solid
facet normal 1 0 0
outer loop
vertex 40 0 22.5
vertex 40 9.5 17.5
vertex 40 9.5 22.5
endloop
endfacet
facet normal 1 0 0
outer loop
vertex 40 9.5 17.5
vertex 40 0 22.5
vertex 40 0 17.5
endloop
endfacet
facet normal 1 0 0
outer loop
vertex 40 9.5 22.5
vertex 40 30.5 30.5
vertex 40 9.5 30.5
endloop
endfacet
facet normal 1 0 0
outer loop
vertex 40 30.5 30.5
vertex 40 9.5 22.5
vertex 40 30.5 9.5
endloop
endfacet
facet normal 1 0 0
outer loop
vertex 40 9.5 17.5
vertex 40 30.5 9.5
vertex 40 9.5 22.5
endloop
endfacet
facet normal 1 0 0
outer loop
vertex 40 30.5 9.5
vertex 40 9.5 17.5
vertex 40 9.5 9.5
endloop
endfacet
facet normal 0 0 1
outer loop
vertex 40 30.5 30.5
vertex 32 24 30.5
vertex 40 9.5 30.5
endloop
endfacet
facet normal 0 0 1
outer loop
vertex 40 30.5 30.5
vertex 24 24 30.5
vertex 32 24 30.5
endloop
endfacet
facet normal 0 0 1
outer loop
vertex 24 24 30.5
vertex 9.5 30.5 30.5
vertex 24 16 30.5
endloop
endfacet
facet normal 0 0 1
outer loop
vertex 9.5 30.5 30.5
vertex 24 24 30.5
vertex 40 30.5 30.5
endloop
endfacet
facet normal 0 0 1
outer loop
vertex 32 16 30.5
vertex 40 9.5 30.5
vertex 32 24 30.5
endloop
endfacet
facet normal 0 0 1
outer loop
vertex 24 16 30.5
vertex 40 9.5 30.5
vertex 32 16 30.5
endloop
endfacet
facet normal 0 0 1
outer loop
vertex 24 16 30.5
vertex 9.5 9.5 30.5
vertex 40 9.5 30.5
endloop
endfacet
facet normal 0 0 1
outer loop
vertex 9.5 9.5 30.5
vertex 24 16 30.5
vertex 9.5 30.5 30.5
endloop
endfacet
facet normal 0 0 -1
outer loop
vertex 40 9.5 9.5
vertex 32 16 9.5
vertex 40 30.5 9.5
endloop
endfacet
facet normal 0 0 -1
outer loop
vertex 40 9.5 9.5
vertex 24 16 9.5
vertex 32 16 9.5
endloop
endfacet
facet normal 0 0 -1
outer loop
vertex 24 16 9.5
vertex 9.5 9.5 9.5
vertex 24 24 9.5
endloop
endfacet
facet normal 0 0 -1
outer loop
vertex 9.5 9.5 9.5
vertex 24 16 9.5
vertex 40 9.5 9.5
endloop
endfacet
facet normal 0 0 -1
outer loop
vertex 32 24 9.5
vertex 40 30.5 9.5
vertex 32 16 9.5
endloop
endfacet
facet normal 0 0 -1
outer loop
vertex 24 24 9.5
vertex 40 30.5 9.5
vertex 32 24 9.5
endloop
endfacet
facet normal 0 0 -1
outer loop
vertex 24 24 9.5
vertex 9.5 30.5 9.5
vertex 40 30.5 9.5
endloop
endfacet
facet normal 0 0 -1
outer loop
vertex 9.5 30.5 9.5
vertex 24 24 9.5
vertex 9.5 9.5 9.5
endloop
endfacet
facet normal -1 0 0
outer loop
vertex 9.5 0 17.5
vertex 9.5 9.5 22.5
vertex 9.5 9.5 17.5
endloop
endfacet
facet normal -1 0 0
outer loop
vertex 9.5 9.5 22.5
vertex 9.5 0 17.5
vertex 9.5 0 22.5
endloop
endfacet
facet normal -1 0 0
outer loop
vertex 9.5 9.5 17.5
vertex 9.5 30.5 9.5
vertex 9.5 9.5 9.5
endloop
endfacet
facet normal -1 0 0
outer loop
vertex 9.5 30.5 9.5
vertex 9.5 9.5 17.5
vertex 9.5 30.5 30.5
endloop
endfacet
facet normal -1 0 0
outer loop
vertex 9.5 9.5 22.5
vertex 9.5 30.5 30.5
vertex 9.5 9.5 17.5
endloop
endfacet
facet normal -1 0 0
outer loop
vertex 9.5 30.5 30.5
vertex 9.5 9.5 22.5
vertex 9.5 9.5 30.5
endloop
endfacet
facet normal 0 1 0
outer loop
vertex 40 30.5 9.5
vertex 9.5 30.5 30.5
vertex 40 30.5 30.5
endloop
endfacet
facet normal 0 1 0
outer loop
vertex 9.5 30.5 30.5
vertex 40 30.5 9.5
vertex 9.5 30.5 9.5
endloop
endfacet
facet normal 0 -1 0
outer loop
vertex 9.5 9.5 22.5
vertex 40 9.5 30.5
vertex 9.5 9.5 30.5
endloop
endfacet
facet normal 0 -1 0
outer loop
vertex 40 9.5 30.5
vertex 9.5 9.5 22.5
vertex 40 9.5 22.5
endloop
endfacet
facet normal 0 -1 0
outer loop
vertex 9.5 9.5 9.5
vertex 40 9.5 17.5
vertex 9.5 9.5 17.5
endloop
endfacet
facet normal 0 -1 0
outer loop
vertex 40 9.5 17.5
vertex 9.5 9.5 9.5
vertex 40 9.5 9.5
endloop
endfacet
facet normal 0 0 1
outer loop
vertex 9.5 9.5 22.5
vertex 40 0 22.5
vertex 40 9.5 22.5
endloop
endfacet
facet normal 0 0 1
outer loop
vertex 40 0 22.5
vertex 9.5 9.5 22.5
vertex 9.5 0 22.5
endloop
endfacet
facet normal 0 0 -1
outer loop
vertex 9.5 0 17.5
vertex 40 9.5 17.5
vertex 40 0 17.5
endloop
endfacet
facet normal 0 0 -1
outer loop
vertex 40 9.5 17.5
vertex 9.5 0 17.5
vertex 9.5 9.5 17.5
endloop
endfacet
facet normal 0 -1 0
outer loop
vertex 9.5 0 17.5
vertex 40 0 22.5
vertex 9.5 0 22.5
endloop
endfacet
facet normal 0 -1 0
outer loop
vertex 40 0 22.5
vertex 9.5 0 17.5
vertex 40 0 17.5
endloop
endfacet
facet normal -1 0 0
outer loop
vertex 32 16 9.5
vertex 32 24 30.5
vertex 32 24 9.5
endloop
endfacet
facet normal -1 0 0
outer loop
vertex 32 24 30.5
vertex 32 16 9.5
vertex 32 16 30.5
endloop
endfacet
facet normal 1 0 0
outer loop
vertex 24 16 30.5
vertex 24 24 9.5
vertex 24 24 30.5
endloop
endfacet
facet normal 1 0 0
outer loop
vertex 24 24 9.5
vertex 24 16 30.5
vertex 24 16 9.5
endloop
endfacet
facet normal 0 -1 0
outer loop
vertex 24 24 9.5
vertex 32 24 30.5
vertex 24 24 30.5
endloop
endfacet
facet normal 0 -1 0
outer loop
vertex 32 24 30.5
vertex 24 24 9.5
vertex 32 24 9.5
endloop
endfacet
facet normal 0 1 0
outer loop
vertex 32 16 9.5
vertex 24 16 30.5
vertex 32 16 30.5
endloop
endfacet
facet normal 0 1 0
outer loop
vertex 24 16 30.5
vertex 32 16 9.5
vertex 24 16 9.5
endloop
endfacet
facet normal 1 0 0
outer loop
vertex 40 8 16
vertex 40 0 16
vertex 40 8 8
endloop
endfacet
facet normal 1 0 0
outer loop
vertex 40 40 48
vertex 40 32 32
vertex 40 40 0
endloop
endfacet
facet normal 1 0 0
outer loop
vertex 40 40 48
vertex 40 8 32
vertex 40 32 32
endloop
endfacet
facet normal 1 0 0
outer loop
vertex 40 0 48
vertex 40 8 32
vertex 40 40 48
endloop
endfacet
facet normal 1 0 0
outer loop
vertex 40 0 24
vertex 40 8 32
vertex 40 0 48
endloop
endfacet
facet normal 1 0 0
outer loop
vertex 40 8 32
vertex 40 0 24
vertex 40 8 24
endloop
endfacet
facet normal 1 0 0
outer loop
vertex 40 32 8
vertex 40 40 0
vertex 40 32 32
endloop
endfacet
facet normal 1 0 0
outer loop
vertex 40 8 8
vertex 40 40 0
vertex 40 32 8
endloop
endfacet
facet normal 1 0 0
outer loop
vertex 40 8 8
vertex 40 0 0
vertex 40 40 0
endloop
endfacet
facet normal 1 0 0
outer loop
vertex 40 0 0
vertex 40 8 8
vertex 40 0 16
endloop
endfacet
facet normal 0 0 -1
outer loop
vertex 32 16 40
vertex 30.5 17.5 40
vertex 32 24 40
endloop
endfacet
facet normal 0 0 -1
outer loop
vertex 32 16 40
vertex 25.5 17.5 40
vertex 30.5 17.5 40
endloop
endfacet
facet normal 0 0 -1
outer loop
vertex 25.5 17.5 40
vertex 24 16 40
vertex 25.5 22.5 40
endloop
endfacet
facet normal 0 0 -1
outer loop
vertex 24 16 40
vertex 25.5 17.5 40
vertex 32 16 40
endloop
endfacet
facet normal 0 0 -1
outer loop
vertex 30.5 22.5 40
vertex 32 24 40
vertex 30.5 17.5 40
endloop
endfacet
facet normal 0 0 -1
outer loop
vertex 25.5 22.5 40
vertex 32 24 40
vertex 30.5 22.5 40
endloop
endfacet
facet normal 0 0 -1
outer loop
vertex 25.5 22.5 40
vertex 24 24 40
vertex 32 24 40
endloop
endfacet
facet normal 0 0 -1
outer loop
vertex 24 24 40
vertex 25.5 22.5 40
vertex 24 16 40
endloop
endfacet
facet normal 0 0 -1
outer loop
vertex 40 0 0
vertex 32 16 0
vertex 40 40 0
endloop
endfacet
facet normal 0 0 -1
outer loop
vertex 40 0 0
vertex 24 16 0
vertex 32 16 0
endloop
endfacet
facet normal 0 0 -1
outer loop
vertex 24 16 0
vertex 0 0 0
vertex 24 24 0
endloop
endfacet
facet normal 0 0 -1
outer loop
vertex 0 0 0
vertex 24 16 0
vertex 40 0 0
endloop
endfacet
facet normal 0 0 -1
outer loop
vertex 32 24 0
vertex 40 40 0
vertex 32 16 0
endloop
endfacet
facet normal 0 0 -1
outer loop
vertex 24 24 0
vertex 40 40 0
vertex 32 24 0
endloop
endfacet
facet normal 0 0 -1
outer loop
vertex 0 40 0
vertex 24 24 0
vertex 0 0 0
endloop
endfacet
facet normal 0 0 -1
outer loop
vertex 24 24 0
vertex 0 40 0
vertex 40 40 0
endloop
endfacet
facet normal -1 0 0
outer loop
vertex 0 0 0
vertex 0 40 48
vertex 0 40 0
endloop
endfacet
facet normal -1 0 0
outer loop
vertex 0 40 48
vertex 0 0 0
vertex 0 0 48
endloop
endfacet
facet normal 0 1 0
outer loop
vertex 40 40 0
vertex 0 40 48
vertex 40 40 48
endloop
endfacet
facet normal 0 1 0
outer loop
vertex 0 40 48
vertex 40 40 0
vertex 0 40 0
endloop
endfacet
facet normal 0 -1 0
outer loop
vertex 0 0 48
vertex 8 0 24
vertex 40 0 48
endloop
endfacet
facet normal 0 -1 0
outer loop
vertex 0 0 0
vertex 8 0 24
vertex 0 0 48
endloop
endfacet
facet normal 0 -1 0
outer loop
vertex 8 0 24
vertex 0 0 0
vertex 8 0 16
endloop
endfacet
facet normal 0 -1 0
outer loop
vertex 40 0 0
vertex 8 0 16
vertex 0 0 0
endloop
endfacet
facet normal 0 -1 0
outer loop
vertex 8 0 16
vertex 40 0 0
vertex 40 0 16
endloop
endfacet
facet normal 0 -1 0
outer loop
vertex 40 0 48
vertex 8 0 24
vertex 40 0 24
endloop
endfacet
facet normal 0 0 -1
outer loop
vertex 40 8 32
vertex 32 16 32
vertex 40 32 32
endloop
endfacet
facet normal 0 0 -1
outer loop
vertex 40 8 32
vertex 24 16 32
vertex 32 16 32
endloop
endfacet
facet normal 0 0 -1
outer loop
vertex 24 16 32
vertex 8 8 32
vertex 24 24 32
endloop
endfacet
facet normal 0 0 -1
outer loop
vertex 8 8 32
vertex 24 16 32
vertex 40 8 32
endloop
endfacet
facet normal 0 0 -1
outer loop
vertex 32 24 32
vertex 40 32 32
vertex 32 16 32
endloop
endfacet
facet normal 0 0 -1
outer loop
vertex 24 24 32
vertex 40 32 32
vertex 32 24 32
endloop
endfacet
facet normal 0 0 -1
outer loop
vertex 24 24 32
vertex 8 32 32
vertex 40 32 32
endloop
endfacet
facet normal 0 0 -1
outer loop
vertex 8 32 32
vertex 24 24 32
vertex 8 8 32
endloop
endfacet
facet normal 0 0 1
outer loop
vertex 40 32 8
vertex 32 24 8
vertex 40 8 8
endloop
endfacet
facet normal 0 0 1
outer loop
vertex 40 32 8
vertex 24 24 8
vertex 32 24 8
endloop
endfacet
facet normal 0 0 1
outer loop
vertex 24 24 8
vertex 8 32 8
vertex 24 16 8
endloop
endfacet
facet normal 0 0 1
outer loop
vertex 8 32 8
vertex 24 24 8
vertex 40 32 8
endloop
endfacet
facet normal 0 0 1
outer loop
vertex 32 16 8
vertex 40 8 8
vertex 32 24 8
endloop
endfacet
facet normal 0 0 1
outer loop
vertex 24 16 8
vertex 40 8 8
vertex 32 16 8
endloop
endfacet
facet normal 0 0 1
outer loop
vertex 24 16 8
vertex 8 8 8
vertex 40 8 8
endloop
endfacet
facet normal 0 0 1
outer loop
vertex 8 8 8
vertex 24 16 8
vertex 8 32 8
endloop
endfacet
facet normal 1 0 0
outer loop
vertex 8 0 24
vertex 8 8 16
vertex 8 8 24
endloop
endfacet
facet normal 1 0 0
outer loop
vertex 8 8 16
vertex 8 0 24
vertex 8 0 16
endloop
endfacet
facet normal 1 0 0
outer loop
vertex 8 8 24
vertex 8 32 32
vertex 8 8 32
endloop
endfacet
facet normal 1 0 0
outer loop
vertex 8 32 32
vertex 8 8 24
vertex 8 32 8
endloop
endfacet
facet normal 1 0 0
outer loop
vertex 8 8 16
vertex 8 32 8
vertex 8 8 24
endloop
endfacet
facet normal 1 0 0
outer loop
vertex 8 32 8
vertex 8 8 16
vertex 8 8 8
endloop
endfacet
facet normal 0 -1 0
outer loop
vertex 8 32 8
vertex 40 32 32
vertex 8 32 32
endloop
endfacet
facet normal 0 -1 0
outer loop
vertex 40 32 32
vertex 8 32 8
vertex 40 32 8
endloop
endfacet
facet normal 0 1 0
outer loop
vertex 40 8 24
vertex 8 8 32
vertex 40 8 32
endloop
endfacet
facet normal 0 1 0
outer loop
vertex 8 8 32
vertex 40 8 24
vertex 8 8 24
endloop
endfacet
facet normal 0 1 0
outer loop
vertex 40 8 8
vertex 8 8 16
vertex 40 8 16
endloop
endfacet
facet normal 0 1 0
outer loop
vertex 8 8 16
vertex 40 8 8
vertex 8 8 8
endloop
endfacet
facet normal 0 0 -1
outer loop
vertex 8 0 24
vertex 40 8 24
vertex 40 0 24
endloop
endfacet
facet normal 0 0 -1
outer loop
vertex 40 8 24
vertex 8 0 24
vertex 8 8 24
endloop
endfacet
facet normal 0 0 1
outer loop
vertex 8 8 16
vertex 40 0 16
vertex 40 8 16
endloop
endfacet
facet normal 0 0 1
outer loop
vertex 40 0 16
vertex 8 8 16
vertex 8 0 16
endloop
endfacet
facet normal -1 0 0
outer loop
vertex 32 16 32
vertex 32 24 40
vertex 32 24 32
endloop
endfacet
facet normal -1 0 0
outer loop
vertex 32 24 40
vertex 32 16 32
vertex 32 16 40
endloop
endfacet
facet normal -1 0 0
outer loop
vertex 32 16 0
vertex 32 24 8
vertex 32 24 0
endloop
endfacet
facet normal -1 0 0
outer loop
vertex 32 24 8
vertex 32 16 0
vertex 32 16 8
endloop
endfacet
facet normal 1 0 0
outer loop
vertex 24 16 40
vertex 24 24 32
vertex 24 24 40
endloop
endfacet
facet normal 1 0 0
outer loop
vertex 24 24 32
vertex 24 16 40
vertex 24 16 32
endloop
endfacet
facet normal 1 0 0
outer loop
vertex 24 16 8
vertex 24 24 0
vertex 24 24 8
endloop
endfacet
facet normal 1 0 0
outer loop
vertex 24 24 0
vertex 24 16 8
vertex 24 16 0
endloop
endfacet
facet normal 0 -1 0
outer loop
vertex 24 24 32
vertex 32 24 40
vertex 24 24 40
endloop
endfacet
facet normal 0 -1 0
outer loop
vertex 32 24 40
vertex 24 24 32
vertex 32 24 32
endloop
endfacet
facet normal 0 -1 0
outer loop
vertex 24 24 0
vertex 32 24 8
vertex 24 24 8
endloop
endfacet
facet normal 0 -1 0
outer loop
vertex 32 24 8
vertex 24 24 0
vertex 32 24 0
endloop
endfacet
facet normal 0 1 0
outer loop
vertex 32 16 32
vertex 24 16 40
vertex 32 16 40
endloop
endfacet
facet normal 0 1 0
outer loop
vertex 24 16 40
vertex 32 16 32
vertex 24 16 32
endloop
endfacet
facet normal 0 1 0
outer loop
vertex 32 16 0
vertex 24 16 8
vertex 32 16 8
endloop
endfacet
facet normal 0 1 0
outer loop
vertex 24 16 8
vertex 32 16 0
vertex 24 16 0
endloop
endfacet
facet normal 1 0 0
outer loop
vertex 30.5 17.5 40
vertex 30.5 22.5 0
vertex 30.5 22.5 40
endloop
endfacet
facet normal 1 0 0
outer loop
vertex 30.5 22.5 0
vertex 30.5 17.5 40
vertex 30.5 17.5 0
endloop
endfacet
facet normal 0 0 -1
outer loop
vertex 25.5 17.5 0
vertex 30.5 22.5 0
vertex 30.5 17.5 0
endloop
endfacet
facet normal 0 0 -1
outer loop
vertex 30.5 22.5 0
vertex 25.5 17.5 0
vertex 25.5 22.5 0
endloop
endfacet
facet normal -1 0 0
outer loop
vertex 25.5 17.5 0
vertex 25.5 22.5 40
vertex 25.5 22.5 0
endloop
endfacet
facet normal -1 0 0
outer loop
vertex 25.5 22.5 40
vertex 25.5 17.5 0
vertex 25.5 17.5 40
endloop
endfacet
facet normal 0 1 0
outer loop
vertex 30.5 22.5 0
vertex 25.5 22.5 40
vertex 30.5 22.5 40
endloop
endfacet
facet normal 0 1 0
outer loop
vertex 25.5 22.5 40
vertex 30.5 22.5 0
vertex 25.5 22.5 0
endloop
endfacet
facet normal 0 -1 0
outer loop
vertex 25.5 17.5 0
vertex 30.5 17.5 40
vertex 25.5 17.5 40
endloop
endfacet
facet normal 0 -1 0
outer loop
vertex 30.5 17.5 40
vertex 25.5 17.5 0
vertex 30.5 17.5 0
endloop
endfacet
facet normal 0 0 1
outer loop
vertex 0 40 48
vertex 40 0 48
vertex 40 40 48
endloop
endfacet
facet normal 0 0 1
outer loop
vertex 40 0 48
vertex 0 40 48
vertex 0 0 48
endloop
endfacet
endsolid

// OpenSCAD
module female(w,h,d,t,s){
    difference(){
        cube([w,d,h]);
        translate([t,t,t]) cube([w-t,d-t*2, h-t*2]);
        translate([t,0,2*t]) cube([w-t,t,t]);
        translate([w-t*2,2*t,0]) cube([t,d-4*t,h]);
    }
}


module male(w,h,d,t,s){
    difference(){
    union(){
        translate([t+s,t+s,t+s]) cube([w-t-s,d-t*2-2*s, h-t*2-2*s]);
        translate([t+s,0,2*t+s]) cube([w-t-s,t+s,t-2*s]);
    }
    translate([w-t*2,2*t,0]) cube([t,d-4*t,h]);
}
}

module lock(w,h,d,t,s){
    union(){
        translate([w-t*2+s,2*t+s,0]) cube([t-2*s,d-4*t-2*s,h]);
        translate([0,0,h]) cube([w,d,t]);
    }
}

module model(w,h,d,t,s){
    male(w,h,d,t,s);
    female(w,h,d,t,s);
    lock(w,h,d,t,s);
}
model(40,40,40,8,1.5);
